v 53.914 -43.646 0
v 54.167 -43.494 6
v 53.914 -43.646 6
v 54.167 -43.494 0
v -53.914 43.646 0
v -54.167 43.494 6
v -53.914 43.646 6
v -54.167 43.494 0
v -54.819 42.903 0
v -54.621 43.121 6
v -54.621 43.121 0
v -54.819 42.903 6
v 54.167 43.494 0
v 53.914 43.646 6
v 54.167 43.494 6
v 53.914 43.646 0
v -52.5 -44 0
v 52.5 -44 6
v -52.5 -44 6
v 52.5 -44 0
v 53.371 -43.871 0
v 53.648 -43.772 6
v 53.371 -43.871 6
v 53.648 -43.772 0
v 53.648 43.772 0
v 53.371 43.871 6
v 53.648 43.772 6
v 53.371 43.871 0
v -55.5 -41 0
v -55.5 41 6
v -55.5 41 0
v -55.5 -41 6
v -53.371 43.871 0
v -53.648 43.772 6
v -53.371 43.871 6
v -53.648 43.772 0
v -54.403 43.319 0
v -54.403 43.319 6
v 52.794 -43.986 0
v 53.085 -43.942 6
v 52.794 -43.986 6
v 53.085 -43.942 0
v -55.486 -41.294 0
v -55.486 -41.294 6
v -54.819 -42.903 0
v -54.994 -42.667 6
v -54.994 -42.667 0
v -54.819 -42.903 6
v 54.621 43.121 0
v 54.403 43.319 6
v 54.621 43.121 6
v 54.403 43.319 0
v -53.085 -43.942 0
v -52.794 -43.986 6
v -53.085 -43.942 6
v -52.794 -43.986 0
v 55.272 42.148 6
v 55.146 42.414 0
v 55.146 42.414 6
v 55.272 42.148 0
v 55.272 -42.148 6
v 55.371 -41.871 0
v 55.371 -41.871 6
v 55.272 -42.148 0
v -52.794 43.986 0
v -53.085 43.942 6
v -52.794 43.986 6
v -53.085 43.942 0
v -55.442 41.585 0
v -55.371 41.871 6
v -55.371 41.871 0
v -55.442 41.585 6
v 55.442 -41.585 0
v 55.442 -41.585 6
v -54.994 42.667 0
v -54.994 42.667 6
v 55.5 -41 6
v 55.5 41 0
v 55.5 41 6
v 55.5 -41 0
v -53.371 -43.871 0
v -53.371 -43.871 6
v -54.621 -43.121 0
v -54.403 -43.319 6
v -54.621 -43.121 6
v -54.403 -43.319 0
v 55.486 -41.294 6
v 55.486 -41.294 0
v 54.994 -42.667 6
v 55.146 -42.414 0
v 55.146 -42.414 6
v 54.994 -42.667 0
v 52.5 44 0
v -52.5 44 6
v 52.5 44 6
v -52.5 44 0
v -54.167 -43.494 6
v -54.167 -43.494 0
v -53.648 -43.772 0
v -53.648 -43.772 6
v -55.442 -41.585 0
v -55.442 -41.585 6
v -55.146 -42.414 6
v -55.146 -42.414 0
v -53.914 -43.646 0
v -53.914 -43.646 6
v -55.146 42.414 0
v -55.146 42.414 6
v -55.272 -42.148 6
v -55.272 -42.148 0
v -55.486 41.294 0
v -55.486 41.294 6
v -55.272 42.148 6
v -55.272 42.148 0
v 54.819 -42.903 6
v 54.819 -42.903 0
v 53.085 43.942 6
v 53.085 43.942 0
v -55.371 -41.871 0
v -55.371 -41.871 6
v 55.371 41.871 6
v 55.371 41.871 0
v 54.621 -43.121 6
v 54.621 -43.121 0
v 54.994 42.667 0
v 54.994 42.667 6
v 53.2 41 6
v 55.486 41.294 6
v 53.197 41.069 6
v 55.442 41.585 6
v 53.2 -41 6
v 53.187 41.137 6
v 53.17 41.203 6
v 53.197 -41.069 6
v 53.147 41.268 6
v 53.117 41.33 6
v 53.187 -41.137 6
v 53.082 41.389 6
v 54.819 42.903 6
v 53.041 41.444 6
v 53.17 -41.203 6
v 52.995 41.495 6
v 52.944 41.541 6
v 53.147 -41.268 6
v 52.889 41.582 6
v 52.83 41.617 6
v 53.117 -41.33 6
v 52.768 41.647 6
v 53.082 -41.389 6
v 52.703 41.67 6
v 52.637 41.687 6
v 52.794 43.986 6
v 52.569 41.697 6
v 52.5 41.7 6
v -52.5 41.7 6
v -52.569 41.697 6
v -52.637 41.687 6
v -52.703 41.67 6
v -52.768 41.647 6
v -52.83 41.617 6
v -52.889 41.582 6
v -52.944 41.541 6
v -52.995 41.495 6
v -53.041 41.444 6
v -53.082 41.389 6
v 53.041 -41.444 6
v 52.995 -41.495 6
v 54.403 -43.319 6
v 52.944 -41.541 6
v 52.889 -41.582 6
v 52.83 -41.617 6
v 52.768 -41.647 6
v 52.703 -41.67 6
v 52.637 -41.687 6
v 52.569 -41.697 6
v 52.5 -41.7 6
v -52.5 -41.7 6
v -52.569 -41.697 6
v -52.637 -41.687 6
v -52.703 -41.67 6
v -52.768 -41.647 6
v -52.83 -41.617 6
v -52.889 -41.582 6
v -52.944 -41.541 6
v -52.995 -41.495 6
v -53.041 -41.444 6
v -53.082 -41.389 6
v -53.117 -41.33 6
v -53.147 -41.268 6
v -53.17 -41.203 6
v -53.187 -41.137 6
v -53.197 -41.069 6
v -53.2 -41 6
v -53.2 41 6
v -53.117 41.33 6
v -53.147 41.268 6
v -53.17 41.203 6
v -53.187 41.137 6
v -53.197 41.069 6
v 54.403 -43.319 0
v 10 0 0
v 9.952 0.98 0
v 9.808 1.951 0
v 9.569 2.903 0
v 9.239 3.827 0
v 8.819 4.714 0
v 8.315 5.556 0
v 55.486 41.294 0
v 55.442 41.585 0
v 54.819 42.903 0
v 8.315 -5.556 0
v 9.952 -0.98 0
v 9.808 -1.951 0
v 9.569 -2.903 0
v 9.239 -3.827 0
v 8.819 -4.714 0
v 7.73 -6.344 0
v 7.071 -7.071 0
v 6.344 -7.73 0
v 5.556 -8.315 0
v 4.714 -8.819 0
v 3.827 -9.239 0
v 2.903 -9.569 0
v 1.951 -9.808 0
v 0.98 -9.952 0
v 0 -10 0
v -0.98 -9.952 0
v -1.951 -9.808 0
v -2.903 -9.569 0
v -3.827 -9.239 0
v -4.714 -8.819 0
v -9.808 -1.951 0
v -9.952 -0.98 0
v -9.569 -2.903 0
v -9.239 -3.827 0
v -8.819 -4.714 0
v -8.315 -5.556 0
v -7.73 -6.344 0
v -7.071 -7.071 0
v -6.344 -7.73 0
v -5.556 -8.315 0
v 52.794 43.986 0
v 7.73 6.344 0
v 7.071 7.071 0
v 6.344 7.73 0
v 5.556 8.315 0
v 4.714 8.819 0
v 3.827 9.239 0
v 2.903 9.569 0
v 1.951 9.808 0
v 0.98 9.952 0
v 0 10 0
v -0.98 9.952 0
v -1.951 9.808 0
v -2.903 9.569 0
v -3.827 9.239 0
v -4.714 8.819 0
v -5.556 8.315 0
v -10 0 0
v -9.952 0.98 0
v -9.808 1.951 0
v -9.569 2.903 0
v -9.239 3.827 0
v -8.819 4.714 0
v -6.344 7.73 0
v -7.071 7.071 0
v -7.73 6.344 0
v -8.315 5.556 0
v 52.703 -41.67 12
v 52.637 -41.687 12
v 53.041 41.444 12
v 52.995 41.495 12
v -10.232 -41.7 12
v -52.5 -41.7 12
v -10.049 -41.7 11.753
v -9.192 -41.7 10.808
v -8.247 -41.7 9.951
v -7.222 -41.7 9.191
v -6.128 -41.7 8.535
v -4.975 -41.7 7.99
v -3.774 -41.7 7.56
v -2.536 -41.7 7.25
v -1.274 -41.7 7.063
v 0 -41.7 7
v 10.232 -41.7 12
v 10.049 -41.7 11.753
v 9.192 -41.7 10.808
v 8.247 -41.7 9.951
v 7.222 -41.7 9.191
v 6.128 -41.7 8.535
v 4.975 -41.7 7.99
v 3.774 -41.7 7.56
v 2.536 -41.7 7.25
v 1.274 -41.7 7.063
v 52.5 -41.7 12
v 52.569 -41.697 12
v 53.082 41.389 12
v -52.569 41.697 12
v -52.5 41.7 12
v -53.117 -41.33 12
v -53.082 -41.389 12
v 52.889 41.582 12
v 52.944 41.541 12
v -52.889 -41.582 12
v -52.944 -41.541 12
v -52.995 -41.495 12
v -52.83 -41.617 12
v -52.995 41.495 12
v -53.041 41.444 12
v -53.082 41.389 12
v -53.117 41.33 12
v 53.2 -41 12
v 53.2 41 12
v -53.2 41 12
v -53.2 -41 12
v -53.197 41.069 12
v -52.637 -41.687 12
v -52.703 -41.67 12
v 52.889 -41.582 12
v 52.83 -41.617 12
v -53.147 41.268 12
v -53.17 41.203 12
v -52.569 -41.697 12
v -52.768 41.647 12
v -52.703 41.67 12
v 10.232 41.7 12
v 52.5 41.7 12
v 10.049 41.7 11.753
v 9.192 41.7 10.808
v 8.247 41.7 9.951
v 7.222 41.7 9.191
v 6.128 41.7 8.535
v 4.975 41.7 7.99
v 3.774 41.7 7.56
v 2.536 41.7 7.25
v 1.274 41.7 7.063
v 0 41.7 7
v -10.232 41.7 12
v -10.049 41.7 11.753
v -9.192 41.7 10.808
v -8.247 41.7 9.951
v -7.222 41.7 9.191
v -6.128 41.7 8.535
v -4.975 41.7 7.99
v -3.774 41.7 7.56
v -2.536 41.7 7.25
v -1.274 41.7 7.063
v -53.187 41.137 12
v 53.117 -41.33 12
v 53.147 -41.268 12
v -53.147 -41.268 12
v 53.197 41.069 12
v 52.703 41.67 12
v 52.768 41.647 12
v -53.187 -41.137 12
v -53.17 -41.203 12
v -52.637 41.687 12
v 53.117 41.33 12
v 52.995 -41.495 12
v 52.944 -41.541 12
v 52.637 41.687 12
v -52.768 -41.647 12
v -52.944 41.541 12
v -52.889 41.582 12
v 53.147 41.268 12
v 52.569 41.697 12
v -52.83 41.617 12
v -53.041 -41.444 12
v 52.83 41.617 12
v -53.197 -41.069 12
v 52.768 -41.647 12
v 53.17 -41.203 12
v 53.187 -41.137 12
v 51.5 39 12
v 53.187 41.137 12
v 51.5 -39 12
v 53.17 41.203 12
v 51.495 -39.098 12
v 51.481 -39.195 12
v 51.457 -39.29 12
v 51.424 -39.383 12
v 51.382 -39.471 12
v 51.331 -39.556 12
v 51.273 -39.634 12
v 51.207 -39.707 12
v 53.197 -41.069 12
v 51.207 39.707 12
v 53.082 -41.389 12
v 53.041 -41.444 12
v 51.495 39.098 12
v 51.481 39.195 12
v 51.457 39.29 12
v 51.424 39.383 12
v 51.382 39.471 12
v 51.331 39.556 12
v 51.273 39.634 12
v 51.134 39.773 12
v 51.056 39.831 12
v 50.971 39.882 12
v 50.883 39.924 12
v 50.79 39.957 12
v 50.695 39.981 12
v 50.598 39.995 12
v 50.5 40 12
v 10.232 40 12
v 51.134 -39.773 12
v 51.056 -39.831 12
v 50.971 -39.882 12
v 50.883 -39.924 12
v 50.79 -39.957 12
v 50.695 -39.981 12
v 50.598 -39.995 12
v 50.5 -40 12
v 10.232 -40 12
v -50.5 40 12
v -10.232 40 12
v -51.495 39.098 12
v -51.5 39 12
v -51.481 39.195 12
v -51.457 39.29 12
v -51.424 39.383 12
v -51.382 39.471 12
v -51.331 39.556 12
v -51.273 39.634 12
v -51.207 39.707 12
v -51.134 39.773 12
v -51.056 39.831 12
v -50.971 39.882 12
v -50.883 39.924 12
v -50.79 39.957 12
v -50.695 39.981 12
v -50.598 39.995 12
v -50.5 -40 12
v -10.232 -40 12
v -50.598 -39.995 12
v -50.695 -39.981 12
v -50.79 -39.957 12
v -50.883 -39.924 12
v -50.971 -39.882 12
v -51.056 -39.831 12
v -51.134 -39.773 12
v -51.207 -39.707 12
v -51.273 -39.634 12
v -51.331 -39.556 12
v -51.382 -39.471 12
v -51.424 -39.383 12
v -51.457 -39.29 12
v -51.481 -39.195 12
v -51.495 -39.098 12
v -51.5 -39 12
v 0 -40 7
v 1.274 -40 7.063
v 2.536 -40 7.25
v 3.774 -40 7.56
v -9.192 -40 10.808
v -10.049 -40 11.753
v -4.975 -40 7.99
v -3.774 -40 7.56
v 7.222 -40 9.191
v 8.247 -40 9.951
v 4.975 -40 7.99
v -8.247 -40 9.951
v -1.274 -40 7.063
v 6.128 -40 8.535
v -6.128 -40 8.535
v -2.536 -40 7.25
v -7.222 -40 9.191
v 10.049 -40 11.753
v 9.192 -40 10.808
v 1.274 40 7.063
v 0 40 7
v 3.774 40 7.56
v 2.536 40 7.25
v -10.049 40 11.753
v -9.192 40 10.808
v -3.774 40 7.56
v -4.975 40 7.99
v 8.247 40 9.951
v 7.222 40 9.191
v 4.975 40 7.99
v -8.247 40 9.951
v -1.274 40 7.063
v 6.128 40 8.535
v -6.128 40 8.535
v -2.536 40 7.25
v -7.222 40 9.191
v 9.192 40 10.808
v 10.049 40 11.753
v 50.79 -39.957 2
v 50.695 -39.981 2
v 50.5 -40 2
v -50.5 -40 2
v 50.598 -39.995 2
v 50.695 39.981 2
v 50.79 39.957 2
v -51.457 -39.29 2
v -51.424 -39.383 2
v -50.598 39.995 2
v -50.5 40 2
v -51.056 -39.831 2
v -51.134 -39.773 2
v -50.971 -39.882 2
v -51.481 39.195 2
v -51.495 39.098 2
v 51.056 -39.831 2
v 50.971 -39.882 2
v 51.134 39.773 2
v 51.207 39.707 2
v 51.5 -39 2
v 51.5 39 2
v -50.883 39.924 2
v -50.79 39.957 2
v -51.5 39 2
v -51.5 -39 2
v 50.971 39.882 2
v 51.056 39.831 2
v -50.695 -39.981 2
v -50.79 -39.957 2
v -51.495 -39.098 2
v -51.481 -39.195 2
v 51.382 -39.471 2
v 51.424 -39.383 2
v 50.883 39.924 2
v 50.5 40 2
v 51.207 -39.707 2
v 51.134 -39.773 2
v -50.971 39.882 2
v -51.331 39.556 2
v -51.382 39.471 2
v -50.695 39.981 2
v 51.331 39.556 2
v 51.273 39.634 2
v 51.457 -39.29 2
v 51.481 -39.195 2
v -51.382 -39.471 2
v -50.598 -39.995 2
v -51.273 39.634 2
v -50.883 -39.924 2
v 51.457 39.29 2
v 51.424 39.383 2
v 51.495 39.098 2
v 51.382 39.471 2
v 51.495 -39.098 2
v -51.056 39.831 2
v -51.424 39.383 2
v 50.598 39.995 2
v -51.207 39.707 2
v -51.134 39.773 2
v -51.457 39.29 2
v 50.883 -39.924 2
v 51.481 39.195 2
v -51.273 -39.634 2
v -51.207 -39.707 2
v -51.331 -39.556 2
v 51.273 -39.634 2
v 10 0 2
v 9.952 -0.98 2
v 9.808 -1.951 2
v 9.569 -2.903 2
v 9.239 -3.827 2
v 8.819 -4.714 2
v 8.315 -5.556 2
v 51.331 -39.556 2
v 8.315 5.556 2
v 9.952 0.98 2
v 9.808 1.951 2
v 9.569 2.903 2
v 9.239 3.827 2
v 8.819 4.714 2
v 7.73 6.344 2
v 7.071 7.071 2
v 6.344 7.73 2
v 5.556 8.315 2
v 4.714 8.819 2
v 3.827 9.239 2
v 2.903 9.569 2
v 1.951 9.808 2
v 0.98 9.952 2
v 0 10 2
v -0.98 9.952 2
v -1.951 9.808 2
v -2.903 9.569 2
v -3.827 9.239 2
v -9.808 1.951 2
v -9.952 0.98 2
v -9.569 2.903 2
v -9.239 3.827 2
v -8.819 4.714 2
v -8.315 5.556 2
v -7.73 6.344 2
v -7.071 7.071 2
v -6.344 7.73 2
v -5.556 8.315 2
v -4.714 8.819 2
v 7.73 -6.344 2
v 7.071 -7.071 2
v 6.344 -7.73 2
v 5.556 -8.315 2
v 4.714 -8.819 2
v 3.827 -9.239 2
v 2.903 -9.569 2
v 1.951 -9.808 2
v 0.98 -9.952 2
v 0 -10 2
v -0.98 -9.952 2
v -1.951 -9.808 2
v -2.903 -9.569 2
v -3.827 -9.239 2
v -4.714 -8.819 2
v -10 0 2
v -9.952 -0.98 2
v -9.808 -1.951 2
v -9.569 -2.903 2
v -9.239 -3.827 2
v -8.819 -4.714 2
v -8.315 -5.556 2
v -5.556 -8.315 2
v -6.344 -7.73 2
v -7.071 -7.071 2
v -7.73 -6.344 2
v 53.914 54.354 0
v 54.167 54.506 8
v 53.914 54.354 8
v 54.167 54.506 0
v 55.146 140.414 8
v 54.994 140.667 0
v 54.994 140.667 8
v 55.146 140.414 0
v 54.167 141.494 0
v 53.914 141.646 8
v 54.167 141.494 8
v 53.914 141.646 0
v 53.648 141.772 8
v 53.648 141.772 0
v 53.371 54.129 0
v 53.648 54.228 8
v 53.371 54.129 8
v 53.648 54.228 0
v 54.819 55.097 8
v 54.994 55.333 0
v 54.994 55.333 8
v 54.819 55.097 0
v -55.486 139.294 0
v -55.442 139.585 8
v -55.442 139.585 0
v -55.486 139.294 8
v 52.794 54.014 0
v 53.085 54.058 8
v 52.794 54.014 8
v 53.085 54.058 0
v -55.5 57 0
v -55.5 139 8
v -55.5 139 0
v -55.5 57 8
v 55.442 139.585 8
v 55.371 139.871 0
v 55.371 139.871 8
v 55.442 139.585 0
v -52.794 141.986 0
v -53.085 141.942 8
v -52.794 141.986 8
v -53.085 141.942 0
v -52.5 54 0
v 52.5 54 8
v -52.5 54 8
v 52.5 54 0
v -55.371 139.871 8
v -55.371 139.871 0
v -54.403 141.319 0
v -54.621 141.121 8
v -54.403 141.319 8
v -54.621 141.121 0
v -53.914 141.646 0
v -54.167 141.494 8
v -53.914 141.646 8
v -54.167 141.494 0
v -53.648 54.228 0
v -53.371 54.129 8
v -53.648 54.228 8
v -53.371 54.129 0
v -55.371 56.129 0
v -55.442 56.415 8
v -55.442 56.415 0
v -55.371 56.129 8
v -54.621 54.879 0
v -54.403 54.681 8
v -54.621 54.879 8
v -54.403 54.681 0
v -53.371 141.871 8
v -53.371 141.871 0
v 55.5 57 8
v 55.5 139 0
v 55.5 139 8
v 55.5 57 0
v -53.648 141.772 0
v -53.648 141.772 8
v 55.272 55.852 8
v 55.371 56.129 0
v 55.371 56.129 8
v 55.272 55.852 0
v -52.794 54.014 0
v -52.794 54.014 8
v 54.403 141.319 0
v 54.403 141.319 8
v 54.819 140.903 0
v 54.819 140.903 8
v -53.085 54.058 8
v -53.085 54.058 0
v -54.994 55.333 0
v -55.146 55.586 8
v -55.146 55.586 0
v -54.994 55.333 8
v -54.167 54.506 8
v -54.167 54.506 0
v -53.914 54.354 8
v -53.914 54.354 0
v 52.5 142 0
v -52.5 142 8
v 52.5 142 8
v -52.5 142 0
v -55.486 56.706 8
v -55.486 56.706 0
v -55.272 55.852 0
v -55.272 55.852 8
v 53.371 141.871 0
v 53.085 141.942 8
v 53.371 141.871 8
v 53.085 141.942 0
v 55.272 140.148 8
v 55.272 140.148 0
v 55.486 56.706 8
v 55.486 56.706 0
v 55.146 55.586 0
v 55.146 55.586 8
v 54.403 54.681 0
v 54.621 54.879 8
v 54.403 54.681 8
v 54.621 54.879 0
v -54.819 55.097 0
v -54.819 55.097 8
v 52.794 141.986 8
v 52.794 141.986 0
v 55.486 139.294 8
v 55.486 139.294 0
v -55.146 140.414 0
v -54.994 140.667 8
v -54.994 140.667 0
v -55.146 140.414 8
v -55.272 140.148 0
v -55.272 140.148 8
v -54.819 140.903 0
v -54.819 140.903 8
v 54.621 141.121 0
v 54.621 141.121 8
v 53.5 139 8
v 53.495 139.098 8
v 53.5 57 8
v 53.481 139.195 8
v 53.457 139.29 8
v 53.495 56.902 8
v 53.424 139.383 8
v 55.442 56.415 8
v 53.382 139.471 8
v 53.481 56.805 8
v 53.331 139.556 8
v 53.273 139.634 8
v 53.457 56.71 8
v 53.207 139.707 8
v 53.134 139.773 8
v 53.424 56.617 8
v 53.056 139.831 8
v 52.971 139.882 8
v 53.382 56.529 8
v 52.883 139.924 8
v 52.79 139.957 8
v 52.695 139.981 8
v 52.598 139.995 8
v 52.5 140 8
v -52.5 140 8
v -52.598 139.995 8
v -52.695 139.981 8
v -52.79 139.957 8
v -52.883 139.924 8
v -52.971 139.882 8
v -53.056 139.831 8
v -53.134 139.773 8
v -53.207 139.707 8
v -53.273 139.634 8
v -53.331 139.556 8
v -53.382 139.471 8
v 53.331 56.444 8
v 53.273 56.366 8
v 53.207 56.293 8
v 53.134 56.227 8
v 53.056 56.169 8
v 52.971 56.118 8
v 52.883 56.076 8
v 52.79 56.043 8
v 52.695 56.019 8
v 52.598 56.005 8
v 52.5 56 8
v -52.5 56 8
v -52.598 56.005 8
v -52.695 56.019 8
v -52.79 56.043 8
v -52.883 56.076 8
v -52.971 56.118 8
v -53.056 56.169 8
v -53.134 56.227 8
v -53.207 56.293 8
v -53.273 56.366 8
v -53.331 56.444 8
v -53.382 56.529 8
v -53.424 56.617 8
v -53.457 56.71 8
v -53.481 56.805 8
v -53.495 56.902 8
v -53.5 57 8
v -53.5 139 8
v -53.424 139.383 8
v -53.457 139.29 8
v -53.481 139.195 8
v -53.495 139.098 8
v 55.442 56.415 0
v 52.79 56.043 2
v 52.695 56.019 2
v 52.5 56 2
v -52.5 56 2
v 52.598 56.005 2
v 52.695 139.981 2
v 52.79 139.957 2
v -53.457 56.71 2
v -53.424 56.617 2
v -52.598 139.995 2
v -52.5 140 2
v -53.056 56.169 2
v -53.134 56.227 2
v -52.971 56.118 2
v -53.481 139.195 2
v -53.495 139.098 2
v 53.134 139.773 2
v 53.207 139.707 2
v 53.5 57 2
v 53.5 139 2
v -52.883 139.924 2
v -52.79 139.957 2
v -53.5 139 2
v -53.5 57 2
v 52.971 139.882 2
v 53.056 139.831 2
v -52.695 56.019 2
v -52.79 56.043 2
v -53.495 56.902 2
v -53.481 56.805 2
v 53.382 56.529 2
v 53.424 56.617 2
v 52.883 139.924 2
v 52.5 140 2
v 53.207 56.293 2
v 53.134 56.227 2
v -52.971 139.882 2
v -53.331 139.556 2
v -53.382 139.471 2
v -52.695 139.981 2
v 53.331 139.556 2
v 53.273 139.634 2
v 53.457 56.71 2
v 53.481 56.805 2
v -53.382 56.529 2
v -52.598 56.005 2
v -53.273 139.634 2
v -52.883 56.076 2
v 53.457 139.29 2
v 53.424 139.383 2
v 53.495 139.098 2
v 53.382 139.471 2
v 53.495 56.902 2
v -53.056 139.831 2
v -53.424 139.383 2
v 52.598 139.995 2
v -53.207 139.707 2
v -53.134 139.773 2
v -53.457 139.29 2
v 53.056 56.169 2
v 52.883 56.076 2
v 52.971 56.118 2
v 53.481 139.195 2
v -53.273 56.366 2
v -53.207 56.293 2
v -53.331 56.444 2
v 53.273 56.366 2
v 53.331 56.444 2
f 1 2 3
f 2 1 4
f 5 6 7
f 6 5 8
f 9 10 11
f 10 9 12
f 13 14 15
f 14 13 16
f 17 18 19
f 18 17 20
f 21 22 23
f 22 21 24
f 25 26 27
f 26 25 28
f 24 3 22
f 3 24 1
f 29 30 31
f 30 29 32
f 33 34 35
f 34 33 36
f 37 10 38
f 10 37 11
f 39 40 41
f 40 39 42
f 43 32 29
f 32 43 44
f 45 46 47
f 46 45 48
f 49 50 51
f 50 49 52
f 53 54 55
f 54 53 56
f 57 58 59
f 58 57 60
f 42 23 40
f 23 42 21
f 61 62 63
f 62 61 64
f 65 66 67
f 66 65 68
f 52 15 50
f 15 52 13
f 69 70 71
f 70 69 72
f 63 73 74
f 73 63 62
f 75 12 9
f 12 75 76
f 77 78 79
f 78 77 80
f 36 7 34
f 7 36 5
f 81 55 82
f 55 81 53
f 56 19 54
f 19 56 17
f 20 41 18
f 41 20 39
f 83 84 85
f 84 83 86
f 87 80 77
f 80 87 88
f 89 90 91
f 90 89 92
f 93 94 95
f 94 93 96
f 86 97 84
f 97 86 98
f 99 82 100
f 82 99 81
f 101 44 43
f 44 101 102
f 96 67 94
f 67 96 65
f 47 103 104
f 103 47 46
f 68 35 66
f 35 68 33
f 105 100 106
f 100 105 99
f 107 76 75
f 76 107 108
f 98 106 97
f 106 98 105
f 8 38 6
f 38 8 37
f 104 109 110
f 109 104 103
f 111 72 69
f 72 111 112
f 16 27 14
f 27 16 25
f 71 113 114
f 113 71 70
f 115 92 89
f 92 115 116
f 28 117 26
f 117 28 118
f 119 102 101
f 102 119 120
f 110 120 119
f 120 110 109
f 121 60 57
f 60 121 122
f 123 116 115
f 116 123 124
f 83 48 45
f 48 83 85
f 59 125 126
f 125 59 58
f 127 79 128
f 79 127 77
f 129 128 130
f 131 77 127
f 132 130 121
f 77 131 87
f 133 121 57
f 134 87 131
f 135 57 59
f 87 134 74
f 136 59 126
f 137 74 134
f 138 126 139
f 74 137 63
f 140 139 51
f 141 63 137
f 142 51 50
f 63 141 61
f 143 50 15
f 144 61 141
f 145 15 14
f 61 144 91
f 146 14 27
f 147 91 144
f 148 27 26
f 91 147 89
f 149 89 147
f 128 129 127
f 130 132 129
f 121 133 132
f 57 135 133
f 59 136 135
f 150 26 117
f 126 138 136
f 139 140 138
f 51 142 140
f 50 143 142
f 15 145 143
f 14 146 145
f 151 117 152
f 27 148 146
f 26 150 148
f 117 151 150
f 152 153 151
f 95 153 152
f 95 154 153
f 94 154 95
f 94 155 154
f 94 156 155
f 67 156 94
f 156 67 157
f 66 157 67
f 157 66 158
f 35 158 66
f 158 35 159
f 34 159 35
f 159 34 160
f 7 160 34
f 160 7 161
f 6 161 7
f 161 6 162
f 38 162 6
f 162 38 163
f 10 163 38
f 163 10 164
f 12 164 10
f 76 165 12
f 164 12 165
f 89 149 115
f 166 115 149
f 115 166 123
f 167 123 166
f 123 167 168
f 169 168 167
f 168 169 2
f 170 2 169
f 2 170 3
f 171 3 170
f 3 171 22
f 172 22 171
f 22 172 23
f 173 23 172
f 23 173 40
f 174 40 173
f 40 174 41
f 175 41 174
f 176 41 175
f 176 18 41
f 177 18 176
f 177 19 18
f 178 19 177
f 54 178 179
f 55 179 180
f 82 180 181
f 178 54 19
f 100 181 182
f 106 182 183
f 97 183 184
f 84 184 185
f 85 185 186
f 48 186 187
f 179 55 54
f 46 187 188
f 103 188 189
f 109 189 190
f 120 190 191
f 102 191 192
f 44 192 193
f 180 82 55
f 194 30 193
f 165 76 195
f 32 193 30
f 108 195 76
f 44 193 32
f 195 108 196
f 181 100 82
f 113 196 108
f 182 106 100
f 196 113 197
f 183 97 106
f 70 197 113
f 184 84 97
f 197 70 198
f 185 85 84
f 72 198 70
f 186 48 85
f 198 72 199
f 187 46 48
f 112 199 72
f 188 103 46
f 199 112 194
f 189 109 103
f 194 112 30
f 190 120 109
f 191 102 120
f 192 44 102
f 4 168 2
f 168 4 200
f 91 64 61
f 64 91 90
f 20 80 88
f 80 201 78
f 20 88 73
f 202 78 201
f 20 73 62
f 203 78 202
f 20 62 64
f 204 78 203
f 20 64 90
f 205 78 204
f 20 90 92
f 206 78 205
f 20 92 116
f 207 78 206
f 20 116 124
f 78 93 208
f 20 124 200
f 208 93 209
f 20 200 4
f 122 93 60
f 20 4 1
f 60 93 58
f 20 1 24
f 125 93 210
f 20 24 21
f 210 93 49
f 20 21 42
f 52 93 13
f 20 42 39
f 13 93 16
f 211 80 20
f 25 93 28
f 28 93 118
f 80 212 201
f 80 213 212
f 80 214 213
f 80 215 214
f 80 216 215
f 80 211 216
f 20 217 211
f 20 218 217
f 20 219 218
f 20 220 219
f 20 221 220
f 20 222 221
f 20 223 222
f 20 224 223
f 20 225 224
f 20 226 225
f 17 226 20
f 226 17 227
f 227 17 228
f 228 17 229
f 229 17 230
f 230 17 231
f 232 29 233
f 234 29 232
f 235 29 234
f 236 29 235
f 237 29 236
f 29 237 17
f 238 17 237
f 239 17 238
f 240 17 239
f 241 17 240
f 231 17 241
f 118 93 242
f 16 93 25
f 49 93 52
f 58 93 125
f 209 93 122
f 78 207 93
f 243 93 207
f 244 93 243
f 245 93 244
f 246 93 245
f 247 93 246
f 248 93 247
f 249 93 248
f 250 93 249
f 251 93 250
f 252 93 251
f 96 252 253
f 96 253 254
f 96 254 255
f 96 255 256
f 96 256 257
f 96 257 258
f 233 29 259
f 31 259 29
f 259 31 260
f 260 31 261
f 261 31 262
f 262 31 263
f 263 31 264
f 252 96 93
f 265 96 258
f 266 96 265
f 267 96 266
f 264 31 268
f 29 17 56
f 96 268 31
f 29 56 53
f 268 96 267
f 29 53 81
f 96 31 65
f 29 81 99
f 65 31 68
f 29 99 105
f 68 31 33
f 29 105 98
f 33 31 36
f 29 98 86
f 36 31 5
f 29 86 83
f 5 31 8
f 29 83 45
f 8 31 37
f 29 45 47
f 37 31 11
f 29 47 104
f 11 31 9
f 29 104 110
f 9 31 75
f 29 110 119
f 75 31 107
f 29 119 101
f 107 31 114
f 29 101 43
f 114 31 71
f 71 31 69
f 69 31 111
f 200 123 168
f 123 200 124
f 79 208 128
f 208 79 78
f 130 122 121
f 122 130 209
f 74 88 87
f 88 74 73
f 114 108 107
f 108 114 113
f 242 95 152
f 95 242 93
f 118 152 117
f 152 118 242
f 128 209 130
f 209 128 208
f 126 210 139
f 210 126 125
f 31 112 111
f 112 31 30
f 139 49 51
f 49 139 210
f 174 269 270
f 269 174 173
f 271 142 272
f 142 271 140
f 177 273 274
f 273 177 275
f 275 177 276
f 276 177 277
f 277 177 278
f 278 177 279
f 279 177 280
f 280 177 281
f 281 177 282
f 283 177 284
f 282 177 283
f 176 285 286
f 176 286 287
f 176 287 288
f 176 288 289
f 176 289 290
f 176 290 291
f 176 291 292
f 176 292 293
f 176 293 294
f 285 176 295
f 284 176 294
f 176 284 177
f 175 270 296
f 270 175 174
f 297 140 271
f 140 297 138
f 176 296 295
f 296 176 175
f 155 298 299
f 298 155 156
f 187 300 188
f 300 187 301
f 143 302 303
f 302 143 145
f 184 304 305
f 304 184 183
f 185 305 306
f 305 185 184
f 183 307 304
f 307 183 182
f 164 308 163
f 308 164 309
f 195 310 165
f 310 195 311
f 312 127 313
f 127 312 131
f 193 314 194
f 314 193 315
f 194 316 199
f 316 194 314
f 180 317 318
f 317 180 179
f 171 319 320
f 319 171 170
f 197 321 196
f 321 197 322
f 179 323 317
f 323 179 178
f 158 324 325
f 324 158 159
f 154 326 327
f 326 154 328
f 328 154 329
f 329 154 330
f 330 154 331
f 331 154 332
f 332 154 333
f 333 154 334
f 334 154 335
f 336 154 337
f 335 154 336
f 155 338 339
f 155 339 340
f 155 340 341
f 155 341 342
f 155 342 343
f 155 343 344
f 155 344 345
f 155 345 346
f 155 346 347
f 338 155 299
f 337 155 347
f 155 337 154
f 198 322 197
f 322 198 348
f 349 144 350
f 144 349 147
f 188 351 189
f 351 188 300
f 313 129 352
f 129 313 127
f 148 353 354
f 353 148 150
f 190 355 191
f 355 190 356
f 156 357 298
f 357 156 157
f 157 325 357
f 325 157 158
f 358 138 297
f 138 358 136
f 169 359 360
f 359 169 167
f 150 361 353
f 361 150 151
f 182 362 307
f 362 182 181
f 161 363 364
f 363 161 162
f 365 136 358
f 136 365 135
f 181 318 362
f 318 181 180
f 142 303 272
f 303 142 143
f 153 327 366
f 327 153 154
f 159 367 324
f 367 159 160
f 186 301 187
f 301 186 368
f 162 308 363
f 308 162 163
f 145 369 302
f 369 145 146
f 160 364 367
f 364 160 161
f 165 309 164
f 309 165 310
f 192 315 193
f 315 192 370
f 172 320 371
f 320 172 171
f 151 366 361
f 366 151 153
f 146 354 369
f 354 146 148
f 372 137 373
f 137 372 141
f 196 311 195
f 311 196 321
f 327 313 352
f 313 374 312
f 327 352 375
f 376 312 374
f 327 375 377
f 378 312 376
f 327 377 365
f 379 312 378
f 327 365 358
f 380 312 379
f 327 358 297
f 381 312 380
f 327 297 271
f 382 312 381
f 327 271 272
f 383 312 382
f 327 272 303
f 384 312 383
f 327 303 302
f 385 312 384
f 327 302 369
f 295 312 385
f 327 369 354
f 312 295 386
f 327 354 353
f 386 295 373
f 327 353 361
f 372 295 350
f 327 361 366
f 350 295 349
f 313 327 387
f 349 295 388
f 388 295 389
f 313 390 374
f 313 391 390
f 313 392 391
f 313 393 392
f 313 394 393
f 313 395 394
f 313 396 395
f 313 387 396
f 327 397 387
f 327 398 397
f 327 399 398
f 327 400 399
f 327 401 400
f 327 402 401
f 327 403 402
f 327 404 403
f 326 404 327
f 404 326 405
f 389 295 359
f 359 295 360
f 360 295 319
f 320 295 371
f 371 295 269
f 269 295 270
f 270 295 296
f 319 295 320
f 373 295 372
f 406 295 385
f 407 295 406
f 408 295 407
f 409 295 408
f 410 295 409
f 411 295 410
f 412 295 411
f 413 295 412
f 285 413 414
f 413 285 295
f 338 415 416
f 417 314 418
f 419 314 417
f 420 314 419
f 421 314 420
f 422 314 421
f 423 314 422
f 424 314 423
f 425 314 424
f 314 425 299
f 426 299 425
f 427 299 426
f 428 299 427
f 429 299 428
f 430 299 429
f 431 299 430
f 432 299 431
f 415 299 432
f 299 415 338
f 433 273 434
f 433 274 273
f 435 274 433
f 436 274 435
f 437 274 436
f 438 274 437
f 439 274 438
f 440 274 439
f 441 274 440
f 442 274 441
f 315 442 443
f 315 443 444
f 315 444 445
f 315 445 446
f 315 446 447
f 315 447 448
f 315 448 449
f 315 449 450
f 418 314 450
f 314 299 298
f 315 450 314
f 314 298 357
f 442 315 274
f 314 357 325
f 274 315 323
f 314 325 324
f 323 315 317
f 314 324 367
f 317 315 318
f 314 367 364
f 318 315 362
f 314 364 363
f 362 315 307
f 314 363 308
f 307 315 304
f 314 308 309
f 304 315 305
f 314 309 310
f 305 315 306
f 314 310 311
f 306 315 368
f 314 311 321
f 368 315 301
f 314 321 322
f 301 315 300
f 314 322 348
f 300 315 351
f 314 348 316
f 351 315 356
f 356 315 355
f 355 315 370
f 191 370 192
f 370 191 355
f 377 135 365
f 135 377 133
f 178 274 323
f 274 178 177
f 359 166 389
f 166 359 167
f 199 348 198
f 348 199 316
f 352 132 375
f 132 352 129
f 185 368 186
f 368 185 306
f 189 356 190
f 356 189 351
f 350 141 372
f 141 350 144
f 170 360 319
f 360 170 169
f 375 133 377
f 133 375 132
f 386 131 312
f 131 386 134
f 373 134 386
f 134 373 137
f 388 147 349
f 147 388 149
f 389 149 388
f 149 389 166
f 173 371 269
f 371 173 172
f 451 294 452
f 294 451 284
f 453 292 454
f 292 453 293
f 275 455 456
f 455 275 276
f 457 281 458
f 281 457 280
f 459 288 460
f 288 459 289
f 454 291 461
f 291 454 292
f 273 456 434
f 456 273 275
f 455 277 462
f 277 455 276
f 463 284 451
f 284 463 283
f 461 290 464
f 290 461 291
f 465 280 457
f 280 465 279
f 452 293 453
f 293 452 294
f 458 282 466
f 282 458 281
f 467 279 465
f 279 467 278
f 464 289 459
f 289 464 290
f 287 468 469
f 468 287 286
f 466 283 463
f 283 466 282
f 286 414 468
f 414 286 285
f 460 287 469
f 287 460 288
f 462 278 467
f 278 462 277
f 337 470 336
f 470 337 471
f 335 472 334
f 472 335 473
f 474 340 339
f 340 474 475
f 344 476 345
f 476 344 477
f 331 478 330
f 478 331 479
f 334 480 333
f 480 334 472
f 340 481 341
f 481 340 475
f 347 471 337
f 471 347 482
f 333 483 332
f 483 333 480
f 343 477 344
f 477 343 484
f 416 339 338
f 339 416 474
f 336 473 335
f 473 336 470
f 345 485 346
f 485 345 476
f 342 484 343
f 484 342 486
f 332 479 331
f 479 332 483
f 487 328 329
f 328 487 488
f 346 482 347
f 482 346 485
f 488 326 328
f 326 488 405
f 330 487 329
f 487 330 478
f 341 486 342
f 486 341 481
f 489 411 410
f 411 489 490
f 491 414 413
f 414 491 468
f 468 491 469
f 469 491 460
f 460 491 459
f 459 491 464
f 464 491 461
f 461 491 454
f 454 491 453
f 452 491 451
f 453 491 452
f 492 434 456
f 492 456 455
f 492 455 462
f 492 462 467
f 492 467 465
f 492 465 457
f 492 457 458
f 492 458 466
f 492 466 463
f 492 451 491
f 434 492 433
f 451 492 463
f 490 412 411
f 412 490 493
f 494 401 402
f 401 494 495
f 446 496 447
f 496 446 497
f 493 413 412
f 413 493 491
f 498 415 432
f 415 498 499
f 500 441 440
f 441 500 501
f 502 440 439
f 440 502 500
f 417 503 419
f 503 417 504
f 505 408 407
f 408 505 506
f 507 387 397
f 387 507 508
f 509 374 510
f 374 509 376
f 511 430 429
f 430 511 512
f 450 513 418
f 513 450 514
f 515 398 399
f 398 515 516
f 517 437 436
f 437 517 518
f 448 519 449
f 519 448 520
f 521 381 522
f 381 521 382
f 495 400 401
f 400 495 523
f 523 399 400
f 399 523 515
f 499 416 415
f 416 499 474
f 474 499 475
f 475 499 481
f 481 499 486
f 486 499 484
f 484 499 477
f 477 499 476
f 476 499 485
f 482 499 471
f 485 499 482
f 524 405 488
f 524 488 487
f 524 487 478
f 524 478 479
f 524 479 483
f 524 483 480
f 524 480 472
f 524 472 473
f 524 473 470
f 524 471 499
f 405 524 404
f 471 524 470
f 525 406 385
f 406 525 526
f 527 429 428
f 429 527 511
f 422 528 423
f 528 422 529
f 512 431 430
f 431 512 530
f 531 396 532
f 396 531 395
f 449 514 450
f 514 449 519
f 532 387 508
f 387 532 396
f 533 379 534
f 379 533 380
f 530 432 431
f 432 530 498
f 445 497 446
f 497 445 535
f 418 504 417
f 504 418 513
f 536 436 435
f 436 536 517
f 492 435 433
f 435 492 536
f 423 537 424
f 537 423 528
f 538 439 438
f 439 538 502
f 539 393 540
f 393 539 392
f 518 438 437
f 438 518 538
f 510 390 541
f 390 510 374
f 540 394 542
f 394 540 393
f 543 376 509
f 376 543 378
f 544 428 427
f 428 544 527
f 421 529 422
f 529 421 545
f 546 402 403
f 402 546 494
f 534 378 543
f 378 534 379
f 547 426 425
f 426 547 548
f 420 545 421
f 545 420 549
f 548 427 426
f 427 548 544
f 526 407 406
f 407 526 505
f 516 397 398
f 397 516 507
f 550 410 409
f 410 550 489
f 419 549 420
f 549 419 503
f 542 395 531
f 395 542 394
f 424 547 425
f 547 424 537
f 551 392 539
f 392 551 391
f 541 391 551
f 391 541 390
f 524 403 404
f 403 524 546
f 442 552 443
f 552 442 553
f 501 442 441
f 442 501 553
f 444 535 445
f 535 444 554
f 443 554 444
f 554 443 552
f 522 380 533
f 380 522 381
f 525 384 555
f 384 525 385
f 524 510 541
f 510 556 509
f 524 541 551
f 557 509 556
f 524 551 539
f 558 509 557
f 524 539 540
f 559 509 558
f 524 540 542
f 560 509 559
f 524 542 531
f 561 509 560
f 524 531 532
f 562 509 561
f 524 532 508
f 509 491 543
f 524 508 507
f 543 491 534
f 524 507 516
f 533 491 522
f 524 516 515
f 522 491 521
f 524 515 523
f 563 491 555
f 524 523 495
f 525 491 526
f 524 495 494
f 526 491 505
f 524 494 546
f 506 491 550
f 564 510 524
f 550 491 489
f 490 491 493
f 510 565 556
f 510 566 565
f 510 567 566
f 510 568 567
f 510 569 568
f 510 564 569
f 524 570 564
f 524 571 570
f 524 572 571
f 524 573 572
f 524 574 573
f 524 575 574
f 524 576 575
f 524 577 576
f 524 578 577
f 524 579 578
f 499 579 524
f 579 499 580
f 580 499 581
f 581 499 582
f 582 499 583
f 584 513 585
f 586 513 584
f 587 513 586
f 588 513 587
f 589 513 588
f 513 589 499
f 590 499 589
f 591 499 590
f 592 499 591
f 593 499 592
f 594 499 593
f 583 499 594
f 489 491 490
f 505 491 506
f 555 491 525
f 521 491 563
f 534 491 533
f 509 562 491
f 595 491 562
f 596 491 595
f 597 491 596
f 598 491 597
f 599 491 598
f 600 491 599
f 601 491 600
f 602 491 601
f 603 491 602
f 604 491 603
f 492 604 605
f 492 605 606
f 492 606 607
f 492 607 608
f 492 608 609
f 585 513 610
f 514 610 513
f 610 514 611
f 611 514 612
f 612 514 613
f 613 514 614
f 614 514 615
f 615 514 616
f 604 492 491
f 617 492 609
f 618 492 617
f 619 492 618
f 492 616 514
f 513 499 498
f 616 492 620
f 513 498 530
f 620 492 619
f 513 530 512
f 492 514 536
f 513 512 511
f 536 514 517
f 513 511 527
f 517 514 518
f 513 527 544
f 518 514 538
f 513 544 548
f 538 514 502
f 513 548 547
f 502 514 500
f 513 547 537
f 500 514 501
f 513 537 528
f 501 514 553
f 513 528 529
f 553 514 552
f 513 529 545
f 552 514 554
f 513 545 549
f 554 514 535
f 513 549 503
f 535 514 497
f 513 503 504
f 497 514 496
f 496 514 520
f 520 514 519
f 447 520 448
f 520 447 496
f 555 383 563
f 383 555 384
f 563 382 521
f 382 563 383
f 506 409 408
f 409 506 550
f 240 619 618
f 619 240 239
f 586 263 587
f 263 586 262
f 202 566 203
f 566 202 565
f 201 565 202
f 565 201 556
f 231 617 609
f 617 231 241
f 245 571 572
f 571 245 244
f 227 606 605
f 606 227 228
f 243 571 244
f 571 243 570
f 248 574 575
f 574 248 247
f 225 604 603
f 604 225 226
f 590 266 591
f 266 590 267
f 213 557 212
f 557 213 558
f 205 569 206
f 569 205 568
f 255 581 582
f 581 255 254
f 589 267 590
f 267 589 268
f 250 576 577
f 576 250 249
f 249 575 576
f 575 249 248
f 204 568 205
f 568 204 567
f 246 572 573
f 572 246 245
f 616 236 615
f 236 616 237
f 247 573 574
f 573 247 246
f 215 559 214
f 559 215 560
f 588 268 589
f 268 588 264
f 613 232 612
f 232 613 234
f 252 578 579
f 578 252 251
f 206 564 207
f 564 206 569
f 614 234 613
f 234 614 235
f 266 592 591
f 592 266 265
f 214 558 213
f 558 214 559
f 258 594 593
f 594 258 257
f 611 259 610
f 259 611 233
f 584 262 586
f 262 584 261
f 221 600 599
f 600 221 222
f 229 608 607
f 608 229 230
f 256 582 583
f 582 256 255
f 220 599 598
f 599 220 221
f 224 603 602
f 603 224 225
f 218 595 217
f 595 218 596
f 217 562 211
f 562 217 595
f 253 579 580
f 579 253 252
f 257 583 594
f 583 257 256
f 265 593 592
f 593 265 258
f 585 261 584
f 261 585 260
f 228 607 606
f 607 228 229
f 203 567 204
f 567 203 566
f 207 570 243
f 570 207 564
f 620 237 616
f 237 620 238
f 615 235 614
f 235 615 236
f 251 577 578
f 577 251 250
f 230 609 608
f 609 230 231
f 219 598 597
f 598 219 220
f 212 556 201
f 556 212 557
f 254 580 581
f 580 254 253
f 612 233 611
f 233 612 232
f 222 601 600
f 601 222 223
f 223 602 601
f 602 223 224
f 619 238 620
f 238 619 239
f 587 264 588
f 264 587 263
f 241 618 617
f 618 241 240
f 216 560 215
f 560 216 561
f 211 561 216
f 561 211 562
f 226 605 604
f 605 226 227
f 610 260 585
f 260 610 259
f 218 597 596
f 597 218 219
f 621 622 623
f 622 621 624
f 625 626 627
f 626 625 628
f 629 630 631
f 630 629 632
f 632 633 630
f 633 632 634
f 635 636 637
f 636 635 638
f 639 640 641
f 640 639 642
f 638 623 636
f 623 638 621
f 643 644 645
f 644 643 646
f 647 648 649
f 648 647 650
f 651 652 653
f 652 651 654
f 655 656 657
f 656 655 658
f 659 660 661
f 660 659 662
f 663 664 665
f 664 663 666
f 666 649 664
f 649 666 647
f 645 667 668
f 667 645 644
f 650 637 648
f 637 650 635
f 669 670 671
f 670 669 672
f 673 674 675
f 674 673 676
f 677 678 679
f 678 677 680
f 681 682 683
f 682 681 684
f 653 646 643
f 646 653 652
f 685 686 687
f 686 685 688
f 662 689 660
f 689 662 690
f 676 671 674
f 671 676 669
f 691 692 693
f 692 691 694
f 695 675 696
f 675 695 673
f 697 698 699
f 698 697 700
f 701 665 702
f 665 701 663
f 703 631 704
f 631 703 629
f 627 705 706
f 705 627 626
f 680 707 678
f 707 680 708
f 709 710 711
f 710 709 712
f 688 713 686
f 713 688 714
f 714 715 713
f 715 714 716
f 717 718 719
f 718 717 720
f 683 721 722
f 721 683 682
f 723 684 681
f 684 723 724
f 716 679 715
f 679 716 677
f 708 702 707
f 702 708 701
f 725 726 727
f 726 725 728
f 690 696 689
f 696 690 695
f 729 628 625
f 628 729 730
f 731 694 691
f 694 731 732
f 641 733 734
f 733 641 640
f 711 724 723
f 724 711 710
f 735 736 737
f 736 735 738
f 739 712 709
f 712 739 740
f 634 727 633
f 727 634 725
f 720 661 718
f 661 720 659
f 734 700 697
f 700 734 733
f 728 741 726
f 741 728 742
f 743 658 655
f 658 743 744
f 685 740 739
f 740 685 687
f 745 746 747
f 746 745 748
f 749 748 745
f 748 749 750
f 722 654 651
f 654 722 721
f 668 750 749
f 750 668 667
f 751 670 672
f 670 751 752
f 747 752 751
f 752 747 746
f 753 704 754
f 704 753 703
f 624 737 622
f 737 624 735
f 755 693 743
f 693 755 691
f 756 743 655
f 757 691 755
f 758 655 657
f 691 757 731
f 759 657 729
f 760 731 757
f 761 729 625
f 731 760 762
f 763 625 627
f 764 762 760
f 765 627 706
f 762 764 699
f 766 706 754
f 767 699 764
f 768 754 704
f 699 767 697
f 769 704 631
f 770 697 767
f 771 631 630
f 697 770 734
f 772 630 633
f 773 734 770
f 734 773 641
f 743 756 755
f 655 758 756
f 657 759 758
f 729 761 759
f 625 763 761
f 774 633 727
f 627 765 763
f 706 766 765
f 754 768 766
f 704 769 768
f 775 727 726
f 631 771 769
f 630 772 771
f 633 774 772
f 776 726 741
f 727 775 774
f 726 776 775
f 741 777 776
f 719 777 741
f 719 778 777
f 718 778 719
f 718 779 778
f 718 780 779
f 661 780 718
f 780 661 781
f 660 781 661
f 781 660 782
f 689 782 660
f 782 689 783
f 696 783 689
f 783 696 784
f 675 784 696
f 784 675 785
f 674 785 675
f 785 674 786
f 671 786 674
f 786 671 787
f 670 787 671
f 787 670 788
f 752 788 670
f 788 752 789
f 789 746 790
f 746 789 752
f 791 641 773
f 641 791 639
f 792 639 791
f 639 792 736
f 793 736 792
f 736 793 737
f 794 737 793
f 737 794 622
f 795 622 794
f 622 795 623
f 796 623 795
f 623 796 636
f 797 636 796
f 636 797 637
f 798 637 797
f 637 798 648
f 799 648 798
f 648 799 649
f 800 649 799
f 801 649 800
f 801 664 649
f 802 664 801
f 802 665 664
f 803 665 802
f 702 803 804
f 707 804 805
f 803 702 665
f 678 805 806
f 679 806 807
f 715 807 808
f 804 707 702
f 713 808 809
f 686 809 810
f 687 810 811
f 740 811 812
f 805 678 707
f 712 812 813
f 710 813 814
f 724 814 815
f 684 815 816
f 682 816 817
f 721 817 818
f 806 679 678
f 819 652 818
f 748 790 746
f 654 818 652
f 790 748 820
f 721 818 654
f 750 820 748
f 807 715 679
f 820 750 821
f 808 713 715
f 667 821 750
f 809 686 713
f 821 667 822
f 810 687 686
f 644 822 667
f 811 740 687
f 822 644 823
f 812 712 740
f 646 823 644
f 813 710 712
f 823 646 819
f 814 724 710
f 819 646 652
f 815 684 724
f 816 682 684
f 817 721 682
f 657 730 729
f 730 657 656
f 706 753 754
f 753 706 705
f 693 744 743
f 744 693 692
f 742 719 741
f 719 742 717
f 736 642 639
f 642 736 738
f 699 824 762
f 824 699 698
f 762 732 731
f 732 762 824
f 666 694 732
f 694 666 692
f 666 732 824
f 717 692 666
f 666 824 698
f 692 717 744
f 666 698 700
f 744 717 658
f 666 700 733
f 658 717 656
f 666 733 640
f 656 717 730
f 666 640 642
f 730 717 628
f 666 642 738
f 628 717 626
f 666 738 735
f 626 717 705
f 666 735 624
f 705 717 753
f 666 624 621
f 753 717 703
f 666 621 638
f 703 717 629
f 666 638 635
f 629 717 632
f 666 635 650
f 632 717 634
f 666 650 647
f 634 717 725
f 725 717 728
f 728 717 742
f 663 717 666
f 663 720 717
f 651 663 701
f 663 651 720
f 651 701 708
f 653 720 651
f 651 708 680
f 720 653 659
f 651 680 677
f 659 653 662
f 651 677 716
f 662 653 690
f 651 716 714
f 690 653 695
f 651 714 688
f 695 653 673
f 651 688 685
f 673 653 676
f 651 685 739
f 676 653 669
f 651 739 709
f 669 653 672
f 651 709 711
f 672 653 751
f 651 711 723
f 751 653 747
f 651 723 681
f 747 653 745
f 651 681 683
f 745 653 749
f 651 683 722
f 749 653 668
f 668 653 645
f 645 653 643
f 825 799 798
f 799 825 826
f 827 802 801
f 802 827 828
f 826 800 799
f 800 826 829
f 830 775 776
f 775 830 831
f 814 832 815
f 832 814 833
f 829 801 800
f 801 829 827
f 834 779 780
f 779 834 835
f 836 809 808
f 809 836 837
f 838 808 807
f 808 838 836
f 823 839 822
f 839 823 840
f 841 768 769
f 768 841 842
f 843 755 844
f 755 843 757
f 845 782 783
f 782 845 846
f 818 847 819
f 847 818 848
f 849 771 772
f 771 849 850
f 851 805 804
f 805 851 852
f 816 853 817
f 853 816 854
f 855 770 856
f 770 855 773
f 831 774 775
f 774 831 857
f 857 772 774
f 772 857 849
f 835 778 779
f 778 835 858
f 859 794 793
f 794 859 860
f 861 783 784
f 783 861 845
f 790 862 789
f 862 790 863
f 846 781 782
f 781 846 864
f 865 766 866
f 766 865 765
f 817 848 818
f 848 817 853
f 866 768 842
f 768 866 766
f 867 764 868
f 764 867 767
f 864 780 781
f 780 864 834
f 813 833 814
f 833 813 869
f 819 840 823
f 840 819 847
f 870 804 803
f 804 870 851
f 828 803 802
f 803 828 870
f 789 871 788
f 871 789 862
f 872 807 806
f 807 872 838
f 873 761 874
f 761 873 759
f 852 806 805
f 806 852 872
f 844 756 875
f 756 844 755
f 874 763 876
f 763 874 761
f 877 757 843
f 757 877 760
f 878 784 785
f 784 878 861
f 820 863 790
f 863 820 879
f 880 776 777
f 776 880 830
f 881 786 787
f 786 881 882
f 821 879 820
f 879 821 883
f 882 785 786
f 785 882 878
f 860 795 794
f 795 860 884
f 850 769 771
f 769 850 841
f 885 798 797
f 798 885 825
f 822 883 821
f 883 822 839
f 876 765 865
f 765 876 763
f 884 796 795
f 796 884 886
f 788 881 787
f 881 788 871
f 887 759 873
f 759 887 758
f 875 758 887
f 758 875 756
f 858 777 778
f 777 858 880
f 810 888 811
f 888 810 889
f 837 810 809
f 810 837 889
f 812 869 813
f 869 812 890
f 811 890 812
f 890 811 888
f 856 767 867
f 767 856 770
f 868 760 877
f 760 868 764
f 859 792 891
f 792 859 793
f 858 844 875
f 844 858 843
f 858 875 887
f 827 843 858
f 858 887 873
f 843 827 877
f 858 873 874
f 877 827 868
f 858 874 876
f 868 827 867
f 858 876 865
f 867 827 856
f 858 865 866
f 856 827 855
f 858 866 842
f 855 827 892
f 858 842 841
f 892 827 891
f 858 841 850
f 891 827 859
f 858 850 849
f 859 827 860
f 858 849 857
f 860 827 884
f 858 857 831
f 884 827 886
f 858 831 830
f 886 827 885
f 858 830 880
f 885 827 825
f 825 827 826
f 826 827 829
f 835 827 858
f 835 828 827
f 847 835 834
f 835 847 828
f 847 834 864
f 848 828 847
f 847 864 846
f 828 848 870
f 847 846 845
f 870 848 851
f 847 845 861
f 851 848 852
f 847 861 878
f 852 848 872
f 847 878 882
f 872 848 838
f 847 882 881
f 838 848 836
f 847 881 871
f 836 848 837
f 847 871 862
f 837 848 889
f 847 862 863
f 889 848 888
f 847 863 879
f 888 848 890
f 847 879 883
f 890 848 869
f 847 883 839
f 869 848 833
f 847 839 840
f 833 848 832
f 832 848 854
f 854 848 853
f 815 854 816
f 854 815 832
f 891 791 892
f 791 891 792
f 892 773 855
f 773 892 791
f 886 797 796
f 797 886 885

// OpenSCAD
// Caixa de transporte para 5 top loaders, com tampa de encaixe
// Espaco interno: 103 x 80 x 10 mm. Todas as medidas em mm.

/* [O que mostrar] */
parte = "tudo"; // [tudo, impressao, corpo, tampa, montado]
espaco_pecas = 10;     // distancia entre corpo e tampa no modo impressao
mostrar_cards = false;

/* [Espaco interno] */
int_larg = 103;
int_prof = 80;
int_alt  = 10;
int_raio = 1.0;        // cantos internos

/* [Paredes e encaixe] */
margem = 4.0;          // parede externa (parte de baixo)
piso = 2.0;
degrau_h = 6.0;        // altura do encaixe da tampa
tampa_parede = 2.0;
tampa_topo = 2.0;
folga_tampa = 0.3;
raio = 3.0;            // cantos externos

/* [Recorte para os dedos] */
usar_recorte = true;
recorte_larg = 26;
recorte_prof = 5;      // menor que degrau_h para a tampa cobrir tudo

/* [Furo no fundo (empurrar os top loaders para cima)] */
furo_fundo_d = 20;     // 0 = sem furo
furo_fundo_x = 0;      // posicao a partir do centro
furo_fundo_y = 0;

/* [Gravacao na tampa] */
texto = "";            // ex.: "TOP LOADERS" (vazio = sem gravacao)
texto_tamanho = 12;
texto_profundidade = 0.6;
texto_fonte = "Liberation Sans:style=Bold";

$fn = 64;

// ---------- Valores calculados ----------
W = int_larg + 2 * margem;
D = int_prof + 2 * margem;
corpo_h = piso + int_alt;
base_h = corpo_h - degrau_h;
inset = tampa_parede + folga_tampa;
tampa_h = degrau_h + tampa_topo;

echo(str("Caixa: ", W, " x ", D, " mm | corpo ", corpo_h, " mm | tampa ", tampa_h,
         " mm | fechada ", base_h + tampa_h, " mm | parede no encaixe ", margem - inset, " mm"));

// ---------- Blocos ----------
module retangulo_arredondado(w, d, r) {
    offset(r = r) square([w - 2 * r, d - 2 * r], center = true);
}

module bloco(w, d, h, r) {
    linear_extrude(h) retangulo_arredondado(w, d, max(r, 0.01));
}

// ---------- Corpo ----------
module corpo() {
    difference() {
        union() {
            bloco(W, D, base_h, raio);
            bloco(W - 2 * inset, D - 2 * inset, corpo_h, raio - inset);
        }
        // espaco interno
        translate([0, 0, piso]) bloco(int_larg, int_prof, corpo_h, int_raio);
        // furo no fundo
        if (furo_fundo_d > 0)
            translate([furo_fundo_x, furo_fundo_y, -1]) cylinder(d = furo_fundo_d, h = piso + 2);
        // recortes em U nas laterais compridas
        if (usar_recorte)
            for (s = [-1, 1])
                // fundo do U fica recorte_prof abaixo do topo; corta so a parede
                translate([0, s * D / 2, corpo_h - recorte_prof + recorte_larg / 2])
                    rotate([90, 0, 0])
                        linear_extrude(margem * 3, center = true)
                            hull() {
                                circle(d = recorte_larg);
                                translate([-recorte_larg / 2, 0]) square([recorte_larg, recorte_prof + 1]);
                            }
    }
}

// ---------- Tampa (de cabeca para baixo, pronta para imprimir) ----------
module tampa() {
    difference() {
        bloco(W, D, tampa_h, raio);
        translate([0, 0, tampa_topo])
            bloco(W - 2 * tampa_parede, D - 2 * tampa_parede, tampa_h, raio - tampa_parede);
        if (texto != "")
            translate([0, 0, -0.01])
                linear_extrude(texto_profundidade + 0.01)
                    mirror([1, 0, 0])
                        text(texto, size = texto_tamanho, font = texto_fonte,
                             halign = "center", valign = "center");
    }
}

// top loaders de referencia (aprox. 101 x 77 x 1.5 mm cada)
module cards() {
    color("white", 0.6)
        for (i = [0 : 4])
            translate([0, 0, piso + i * 2 + 0.25])
                linear_extrude(1.5) retangulo_arredondado(101, 77, 2);
}

// ---------- Saida ----------
if (parte == "impressao") {
    translate([0, -(D + espaco_pecas) / 2, 0]) corpo();
    translate([0,  (D + espaco_pecas) / 2, 0]) tampa();
} else if (parte == "corpo") {
    corpo();
} else if (parte == "tampa") {
    tampa();
} else if (parte == "montado") {
    color("SteelBlue") corpo();
    color("LightSteelBlue", 0.5)
        translate([0, 0, base_h + tampa_h]) rotate([0, 180, 0]) tampa();
    if (mostrar_cards) cards();
} else {
    color("SteelBlue") corpo();
    if (mostrar_cards) cards();
    color("LightSteelBlue") translate([0, D + 10, 0]) tampa();
}
